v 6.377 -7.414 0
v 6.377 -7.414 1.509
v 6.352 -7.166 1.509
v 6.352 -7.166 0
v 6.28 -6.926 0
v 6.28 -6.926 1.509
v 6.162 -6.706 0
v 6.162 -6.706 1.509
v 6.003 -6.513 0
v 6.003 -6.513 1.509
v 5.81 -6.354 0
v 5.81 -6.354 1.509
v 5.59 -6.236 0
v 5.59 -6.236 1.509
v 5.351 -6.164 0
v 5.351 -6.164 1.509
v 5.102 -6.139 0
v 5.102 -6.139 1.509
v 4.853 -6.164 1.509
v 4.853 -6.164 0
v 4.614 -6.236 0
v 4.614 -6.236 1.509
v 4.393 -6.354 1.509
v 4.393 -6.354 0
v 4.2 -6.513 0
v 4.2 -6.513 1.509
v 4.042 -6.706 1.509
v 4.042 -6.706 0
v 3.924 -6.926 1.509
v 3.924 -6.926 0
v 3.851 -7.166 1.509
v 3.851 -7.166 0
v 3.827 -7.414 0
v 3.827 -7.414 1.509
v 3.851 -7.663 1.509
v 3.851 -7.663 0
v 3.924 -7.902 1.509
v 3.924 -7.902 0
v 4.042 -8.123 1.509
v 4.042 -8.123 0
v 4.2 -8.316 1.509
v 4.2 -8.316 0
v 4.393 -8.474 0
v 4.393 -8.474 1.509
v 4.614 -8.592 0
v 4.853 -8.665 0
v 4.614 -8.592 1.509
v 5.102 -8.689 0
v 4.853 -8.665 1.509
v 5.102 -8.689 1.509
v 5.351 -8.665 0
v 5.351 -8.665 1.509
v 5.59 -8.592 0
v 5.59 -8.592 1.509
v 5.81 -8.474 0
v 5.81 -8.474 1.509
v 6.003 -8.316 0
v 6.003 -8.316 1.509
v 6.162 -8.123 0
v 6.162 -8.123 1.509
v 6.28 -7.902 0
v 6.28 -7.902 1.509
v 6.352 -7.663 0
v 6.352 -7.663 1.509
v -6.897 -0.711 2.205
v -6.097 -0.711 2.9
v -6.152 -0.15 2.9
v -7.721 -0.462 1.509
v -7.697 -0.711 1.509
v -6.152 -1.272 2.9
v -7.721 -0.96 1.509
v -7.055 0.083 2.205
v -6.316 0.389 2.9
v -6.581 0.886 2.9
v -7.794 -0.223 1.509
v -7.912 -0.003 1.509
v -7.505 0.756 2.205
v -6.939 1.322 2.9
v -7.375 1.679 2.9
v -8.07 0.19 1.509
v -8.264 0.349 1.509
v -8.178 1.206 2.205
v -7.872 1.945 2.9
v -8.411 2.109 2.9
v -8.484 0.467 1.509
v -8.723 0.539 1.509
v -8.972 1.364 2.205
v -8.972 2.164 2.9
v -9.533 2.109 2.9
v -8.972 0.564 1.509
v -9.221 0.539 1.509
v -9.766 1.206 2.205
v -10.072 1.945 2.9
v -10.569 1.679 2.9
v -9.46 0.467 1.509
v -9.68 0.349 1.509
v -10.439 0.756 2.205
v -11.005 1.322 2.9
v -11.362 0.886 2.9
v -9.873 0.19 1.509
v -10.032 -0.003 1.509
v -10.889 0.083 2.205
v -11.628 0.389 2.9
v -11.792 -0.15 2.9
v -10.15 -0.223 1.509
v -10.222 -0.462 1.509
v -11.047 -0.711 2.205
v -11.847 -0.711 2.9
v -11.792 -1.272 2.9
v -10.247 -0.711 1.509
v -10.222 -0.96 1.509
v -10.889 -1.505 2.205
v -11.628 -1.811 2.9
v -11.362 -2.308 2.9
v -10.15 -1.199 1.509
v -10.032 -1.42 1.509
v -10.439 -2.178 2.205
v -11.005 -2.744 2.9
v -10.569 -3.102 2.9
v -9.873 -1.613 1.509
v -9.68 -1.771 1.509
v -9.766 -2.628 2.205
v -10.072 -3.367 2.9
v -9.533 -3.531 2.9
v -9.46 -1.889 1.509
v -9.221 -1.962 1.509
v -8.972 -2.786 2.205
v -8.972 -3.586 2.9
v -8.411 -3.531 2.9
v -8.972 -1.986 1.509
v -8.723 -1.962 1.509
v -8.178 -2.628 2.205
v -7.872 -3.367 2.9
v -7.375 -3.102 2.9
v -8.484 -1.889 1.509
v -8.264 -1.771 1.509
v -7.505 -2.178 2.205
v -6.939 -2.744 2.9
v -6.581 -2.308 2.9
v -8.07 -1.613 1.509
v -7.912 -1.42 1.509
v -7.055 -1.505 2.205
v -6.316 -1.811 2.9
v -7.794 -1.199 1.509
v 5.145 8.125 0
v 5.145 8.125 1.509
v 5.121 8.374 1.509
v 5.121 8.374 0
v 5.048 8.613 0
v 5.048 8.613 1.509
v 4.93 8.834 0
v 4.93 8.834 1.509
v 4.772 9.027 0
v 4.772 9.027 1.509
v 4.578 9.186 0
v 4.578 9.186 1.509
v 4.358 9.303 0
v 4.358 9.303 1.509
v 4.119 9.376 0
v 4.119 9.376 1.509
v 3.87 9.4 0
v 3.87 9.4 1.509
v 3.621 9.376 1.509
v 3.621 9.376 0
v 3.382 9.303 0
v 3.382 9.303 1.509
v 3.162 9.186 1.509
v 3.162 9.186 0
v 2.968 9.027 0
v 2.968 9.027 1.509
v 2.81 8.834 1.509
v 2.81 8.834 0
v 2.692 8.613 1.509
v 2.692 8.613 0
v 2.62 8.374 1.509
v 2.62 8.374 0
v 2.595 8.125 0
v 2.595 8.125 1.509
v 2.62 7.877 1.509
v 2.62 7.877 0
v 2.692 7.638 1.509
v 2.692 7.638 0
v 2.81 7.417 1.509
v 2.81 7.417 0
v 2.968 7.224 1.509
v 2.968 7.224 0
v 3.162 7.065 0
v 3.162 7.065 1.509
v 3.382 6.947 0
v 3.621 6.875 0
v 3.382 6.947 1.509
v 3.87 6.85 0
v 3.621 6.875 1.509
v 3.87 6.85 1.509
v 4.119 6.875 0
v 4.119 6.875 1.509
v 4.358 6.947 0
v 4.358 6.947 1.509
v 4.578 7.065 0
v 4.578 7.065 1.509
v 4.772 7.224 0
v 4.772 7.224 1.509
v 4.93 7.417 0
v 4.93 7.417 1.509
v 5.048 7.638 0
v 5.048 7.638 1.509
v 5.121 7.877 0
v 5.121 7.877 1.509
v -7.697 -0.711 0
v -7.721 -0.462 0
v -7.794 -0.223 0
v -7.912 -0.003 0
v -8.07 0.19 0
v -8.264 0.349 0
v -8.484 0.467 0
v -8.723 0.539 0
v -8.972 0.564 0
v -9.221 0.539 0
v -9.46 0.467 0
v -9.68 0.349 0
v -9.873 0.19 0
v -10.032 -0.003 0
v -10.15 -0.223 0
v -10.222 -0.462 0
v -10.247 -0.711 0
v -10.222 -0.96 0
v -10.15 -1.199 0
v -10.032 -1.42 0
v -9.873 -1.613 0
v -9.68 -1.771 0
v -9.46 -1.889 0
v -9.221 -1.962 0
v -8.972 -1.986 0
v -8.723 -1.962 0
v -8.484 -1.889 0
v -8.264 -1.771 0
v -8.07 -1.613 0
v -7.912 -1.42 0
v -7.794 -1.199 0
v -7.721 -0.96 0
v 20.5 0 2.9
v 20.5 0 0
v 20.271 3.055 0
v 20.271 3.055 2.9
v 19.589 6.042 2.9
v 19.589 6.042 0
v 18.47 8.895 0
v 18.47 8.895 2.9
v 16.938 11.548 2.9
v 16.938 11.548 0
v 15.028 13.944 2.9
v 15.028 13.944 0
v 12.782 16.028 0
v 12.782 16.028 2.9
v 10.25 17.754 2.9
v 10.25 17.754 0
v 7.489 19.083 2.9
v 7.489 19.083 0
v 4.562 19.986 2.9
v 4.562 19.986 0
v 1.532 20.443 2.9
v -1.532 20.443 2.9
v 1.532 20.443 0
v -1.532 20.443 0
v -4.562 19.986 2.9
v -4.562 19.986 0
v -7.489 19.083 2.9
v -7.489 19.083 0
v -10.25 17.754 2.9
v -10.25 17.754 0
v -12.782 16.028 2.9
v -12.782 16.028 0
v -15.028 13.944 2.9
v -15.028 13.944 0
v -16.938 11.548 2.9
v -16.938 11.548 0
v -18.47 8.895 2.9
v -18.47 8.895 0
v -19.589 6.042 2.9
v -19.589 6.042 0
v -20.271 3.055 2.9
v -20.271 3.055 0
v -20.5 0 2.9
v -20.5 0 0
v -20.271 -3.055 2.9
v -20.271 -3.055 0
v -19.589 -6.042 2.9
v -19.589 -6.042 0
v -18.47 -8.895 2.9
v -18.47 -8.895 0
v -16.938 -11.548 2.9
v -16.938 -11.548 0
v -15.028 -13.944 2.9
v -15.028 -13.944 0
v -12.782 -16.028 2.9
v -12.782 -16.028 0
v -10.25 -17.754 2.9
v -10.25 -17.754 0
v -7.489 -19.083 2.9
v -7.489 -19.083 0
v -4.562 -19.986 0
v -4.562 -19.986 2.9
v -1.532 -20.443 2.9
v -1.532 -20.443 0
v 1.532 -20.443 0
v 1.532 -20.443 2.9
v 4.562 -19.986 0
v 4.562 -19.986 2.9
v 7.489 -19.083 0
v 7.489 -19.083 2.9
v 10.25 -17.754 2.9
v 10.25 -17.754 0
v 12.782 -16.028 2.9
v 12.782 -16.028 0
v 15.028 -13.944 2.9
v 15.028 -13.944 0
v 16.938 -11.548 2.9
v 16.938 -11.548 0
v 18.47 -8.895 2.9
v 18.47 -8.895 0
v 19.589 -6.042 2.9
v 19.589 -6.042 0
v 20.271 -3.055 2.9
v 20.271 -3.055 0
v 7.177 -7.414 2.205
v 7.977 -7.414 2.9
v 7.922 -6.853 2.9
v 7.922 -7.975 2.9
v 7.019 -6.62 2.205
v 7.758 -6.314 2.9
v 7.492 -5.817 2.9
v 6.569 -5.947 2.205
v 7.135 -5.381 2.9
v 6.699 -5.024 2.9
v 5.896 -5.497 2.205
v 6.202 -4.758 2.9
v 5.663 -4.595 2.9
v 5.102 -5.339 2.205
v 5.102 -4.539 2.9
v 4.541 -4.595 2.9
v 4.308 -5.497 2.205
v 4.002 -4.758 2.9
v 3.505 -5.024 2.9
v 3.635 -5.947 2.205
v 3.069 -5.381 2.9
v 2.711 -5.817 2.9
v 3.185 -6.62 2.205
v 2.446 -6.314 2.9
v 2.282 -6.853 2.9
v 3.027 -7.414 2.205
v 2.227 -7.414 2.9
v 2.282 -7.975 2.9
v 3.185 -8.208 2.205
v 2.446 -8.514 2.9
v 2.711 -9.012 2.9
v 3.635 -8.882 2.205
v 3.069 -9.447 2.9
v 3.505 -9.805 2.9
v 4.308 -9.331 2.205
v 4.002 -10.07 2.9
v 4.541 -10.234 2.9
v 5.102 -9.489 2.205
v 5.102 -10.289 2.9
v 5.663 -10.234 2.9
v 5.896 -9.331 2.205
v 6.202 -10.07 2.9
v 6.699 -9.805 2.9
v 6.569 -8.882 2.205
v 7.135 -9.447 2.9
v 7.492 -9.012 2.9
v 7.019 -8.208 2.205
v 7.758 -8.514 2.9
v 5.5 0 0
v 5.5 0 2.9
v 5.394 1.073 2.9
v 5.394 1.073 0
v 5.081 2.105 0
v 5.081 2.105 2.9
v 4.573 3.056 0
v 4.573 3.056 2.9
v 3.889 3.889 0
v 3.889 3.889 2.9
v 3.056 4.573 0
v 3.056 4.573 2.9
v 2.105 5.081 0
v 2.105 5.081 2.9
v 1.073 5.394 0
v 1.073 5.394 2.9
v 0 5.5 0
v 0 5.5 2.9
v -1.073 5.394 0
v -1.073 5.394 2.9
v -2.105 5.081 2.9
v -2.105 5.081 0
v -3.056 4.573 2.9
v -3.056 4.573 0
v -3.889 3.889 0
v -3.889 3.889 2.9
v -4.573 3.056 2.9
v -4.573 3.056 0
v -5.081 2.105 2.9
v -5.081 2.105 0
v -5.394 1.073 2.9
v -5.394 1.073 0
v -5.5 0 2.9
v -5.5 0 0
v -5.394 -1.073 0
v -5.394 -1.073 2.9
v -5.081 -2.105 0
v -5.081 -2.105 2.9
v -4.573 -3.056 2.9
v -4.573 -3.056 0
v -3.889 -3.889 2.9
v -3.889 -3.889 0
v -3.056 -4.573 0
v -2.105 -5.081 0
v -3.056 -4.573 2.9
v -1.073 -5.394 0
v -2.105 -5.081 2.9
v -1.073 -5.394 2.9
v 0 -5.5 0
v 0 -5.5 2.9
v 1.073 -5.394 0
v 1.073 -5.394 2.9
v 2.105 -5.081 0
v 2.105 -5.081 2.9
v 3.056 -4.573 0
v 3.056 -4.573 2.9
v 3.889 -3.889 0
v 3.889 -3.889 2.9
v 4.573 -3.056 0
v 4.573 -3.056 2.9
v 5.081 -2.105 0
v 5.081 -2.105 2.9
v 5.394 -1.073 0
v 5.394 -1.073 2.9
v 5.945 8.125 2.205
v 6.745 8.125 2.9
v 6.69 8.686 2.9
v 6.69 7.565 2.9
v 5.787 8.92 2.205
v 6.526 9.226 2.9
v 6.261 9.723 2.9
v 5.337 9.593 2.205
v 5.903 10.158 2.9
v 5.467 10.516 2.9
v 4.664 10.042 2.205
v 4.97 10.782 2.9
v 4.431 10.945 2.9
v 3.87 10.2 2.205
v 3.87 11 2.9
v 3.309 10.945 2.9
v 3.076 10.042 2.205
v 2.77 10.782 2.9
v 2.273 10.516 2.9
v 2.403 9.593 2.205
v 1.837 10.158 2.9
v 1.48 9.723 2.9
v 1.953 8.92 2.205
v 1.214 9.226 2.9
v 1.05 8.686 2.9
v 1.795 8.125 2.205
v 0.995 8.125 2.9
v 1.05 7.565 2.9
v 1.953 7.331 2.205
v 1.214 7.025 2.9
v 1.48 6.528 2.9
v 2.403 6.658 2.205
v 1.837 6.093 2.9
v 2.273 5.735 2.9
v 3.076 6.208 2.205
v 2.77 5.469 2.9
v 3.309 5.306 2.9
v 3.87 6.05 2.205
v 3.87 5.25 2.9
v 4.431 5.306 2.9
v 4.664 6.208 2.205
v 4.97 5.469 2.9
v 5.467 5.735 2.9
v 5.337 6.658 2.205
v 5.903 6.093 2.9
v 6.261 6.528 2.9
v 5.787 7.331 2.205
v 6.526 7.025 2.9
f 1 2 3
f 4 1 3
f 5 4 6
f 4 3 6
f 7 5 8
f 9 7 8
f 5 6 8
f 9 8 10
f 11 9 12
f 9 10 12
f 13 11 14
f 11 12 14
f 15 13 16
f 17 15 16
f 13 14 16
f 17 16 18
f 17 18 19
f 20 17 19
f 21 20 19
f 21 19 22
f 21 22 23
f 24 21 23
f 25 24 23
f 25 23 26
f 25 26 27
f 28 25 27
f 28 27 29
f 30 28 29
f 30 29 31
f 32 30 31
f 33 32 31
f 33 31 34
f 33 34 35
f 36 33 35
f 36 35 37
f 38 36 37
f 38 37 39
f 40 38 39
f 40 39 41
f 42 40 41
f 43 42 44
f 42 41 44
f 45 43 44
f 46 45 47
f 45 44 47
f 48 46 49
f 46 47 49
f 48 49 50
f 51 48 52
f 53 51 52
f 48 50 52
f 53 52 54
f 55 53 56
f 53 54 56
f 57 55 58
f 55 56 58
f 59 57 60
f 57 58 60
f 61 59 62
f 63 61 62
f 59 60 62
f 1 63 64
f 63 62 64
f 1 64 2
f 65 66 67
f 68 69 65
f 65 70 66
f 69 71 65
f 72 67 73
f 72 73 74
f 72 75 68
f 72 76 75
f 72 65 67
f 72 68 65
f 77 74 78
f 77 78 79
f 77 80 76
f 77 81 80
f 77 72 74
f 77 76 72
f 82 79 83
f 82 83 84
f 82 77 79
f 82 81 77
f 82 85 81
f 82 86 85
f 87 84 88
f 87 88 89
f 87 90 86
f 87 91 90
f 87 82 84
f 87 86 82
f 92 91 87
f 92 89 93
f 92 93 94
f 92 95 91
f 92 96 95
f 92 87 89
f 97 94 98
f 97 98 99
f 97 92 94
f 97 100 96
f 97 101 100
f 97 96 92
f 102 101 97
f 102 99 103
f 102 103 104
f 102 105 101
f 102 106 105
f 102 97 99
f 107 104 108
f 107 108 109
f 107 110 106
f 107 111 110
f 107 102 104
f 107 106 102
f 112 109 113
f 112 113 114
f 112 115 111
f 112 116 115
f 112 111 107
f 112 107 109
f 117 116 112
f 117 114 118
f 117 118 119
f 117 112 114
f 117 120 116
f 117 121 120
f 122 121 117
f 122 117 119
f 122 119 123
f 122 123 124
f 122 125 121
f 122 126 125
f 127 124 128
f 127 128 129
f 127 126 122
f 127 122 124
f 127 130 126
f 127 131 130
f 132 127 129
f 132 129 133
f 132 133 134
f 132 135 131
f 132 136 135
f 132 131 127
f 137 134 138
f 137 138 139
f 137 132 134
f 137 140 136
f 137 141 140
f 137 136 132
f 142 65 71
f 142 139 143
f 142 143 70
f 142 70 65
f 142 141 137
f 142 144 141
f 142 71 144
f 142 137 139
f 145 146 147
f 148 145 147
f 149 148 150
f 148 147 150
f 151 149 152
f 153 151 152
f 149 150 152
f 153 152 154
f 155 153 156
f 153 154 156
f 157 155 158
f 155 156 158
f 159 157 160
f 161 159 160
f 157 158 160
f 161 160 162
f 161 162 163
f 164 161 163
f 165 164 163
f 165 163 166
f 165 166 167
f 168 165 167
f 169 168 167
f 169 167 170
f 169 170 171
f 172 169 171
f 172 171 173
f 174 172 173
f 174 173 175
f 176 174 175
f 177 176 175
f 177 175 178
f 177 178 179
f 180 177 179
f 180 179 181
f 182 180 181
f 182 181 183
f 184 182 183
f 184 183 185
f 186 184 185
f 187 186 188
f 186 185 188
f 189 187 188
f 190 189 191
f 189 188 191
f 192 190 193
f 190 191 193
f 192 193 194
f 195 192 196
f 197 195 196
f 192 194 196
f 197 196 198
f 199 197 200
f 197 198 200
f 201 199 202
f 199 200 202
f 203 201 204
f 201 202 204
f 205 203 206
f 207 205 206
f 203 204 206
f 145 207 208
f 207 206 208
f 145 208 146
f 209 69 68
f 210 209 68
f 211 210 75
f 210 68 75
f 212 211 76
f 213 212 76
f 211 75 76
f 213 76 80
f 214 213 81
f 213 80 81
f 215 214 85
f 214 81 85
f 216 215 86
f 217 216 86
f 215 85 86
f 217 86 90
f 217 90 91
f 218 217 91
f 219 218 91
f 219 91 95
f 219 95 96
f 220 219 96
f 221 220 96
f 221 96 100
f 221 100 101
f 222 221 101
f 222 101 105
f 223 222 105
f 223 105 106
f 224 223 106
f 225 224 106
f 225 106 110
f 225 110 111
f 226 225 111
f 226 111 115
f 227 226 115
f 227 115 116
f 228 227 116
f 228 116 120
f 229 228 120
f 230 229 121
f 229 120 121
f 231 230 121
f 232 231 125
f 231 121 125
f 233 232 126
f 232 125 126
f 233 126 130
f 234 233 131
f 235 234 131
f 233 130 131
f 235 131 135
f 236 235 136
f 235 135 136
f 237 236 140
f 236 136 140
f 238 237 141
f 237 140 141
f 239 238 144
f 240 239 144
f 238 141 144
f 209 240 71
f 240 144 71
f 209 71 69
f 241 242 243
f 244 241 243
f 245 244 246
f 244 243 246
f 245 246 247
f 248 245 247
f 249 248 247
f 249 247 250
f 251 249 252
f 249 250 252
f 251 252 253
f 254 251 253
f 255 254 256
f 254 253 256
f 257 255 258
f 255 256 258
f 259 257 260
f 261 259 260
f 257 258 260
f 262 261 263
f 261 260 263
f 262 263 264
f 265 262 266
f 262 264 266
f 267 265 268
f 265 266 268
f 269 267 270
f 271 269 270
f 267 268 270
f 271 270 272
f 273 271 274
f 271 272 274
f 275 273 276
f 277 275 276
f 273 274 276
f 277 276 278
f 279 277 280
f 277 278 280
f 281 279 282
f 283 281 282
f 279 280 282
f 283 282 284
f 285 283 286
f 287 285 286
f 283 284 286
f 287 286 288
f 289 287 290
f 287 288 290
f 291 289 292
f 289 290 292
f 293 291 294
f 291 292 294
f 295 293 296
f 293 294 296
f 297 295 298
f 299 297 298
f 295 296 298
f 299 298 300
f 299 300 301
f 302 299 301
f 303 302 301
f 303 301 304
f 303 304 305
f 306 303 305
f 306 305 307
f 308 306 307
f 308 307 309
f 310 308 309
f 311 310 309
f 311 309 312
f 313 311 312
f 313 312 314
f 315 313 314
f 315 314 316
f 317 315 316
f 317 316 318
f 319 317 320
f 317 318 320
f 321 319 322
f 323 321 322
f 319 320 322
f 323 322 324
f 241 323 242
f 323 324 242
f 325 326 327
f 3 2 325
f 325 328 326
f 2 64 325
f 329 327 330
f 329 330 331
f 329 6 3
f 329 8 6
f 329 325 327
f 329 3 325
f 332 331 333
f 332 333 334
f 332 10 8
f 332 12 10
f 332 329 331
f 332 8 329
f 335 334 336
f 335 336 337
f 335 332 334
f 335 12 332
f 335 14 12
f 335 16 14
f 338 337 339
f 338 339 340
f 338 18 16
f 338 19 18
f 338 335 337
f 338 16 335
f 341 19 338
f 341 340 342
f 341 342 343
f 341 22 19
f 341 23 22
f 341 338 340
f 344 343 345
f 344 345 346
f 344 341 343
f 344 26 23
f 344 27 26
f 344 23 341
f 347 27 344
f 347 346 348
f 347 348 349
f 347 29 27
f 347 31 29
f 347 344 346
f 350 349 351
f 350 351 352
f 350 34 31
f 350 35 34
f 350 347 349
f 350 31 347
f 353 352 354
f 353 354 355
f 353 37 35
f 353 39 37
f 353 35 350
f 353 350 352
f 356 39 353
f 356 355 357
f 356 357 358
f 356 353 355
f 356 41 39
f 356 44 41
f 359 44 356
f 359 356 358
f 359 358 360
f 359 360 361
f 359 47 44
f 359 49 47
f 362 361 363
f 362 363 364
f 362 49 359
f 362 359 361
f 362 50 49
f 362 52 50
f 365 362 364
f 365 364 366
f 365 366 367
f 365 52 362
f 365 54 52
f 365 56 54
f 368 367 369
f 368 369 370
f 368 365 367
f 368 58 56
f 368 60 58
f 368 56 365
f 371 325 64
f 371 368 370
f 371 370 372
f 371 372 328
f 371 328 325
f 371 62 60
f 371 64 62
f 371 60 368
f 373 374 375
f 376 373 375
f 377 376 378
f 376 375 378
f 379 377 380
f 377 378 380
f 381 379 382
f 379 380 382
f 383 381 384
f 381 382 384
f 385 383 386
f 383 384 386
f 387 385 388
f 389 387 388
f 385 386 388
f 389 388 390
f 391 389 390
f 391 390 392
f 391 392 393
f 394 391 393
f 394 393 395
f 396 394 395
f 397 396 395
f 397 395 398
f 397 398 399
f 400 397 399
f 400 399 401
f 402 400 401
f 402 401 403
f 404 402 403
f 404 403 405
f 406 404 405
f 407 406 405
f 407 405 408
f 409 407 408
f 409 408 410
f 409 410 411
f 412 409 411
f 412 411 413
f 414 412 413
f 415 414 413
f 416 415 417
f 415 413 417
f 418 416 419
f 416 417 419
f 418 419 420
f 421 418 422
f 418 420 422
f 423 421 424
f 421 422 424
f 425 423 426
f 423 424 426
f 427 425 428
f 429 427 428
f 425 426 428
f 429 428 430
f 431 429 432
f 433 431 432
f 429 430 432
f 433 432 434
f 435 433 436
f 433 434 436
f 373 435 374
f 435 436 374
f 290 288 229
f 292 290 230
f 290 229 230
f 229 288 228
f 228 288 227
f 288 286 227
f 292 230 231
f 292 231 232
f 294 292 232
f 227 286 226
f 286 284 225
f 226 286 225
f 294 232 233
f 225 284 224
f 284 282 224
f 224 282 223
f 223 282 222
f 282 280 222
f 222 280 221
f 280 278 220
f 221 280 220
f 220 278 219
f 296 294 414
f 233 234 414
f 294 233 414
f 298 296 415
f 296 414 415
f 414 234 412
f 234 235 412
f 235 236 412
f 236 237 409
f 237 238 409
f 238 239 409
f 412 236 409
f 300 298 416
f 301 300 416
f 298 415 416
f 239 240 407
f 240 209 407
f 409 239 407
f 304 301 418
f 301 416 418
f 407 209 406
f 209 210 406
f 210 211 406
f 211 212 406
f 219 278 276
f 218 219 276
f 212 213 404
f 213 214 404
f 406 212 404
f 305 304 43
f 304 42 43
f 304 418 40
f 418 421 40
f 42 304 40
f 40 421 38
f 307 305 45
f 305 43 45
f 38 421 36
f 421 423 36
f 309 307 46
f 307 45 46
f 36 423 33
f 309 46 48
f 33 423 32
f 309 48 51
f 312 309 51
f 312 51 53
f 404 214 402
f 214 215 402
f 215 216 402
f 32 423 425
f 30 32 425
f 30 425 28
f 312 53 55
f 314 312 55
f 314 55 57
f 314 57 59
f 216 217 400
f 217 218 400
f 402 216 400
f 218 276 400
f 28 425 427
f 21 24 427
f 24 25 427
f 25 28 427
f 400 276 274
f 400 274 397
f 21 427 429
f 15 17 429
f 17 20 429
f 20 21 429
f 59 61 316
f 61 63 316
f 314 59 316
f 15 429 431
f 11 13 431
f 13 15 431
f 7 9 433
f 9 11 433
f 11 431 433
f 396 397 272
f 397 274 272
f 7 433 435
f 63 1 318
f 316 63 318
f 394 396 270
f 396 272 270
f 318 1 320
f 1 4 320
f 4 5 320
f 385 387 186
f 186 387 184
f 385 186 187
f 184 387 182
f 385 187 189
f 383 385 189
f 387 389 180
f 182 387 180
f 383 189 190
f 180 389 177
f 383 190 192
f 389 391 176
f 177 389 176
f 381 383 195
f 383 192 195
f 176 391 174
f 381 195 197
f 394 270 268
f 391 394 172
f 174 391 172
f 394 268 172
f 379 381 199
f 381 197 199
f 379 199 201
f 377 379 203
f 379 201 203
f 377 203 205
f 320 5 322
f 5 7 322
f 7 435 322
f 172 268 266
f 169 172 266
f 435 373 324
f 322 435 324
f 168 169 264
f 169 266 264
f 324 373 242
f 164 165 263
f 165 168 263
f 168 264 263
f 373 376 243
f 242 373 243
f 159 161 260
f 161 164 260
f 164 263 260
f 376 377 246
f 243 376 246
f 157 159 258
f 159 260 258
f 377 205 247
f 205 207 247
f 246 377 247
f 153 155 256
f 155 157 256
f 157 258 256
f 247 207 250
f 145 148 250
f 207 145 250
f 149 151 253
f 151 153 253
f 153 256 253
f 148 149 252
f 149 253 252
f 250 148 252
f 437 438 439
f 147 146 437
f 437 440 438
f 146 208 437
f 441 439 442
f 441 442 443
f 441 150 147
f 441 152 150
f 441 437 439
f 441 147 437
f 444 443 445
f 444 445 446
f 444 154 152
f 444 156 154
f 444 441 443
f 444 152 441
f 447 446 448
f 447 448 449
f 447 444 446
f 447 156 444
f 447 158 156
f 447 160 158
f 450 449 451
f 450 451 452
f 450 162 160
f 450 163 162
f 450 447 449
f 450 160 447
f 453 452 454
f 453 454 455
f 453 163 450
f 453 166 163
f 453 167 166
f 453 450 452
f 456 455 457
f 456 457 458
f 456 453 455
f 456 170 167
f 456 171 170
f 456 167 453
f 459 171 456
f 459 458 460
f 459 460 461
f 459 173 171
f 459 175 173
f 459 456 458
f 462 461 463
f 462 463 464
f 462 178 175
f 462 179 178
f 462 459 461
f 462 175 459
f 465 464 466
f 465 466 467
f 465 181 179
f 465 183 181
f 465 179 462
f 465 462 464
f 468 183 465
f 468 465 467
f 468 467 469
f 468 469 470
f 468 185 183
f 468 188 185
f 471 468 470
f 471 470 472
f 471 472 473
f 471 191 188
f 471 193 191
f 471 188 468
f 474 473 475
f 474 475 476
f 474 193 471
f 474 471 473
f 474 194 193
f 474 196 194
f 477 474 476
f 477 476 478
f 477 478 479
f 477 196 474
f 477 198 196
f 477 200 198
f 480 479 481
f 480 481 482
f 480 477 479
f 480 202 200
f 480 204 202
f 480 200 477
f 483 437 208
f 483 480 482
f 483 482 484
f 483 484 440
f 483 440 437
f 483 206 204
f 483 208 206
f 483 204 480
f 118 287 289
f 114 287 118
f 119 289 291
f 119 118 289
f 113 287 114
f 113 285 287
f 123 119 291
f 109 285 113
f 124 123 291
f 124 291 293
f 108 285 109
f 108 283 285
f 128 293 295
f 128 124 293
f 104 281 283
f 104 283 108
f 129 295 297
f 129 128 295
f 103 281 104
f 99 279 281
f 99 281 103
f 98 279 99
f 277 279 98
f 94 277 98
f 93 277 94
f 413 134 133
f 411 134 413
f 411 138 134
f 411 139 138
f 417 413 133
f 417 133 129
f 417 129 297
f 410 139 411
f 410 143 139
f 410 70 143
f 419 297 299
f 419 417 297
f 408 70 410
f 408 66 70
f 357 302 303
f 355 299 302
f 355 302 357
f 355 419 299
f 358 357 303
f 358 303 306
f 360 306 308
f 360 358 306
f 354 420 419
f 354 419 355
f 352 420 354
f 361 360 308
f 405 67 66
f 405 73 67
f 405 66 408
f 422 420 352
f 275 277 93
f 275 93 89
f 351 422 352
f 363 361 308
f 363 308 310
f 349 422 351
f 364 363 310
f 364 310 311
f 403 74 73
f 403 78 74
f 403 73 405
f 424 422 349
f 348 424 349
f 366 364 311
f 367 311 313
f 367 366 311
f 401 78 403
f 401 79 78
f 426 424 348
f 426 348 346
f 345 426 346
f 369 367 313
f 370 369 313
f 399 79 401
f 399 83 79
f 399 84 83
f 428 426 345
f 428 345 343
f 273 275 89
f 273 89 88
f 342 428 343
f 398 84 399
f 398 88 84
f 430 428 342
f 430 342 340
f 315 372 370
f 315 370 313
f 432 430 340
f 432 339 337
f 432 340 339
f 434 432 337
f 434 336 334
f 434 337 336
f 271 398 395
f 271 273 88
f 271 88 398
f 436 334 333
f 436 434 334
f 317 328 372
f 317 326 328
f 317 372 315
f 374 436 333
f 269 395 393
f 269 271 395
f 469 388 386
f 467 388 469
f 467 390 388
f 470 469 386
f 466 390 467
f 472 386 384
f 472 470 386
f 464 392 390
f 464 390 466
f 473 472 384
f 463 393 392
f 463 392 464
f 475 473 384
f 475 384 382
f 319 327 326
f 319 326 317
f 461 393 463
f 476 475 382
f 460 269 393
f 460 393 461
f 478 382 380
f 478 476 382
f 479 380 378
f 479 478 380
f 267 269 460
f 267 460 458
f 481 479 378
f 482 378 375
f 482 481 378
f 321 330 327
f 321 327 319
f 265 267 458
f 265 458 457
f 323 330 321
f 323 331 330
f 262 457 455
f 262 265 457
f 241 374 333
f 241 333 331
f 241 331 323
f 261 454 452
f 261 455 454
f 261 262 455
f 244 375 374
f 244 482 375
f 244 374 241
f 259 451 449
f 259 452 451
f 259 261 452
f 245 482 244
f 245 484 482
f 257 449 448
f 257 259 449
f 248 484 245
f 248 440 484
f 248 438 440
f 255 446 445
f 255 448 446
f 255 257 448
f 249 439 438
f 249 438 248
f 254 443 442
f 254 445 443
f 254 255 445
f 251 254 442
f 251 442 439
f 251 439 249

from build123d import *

# Parameters (mm, degrees)
SKETCH1_R           = 20.5
BOSS_EXTRUDE1_DEPTH = 2.9
SKETCH2_R           = 1.275
CUT_EXTRUDE1_DEPTH  = 30.136060132
CHAMFER1_SIZE       = 1.6
CHAMFER1_SIZE2      = 1.390858781
SKETCH3_R           = 5.5
CUT_EXTRUDE2_DEPTH  = 30.136060132


with BuildPart() as part:
    # Sketch1 → Boss-Extrude1 (new body)
    with BuildSketch(Plane.XY):
        Circle(SKETCH1_R)
    extrude(amount=BOSS_EXTRUDE1_DEPTH)

    # Sketch2 → Cut-Extrude1 (cut, through all)
    with BuildSketch(Plane.XY.offset(2.9)):
        with Locations((-8.971859678, -0.711149714)):
            Circle(SKETCH2_R)
        with Locations((5.101803557, -7.414283544)):
            Circle(SKETCH2_R)
        with Locations((3.870056121, 8.125433257)):
            Circle(SKETCH2_R)
    extrude(amount=-CUT_EXTRUDE1_DEPTH, mode=Mode.SUBTRACT)

    # Chamfer1
    chamfer1_edges = [part.edges().sort_by_distance(p)[0] for p in [
        (3.826803557, -7.414283544, 2.9),
        (2.595056121, 8.125433257, 2.9),
        (-10.246859678, -0.711149714, 2.9),
    ]]
    chamfer1_side = [part.faces().sort_by_distance(p)[0] for p in [
        (0, 0, 2.9),
    ]]
    chamfer(chamfer1_edges, length=CHAMFER1_SIZE, length2=CHAMFER1_SIZE2, reference=chamfer1_side[0])

    # Sketch3 → Cut-Extrude2 (cut, through all)
    with BuildSketch(Plane.XY.offset(2.9)):
        Circle(SKETCH3_R)
    extrude(amount=-CUT_EXTRUDE2_DEPTH, mode=Mode.SUBTRACT)


solid = part.part
